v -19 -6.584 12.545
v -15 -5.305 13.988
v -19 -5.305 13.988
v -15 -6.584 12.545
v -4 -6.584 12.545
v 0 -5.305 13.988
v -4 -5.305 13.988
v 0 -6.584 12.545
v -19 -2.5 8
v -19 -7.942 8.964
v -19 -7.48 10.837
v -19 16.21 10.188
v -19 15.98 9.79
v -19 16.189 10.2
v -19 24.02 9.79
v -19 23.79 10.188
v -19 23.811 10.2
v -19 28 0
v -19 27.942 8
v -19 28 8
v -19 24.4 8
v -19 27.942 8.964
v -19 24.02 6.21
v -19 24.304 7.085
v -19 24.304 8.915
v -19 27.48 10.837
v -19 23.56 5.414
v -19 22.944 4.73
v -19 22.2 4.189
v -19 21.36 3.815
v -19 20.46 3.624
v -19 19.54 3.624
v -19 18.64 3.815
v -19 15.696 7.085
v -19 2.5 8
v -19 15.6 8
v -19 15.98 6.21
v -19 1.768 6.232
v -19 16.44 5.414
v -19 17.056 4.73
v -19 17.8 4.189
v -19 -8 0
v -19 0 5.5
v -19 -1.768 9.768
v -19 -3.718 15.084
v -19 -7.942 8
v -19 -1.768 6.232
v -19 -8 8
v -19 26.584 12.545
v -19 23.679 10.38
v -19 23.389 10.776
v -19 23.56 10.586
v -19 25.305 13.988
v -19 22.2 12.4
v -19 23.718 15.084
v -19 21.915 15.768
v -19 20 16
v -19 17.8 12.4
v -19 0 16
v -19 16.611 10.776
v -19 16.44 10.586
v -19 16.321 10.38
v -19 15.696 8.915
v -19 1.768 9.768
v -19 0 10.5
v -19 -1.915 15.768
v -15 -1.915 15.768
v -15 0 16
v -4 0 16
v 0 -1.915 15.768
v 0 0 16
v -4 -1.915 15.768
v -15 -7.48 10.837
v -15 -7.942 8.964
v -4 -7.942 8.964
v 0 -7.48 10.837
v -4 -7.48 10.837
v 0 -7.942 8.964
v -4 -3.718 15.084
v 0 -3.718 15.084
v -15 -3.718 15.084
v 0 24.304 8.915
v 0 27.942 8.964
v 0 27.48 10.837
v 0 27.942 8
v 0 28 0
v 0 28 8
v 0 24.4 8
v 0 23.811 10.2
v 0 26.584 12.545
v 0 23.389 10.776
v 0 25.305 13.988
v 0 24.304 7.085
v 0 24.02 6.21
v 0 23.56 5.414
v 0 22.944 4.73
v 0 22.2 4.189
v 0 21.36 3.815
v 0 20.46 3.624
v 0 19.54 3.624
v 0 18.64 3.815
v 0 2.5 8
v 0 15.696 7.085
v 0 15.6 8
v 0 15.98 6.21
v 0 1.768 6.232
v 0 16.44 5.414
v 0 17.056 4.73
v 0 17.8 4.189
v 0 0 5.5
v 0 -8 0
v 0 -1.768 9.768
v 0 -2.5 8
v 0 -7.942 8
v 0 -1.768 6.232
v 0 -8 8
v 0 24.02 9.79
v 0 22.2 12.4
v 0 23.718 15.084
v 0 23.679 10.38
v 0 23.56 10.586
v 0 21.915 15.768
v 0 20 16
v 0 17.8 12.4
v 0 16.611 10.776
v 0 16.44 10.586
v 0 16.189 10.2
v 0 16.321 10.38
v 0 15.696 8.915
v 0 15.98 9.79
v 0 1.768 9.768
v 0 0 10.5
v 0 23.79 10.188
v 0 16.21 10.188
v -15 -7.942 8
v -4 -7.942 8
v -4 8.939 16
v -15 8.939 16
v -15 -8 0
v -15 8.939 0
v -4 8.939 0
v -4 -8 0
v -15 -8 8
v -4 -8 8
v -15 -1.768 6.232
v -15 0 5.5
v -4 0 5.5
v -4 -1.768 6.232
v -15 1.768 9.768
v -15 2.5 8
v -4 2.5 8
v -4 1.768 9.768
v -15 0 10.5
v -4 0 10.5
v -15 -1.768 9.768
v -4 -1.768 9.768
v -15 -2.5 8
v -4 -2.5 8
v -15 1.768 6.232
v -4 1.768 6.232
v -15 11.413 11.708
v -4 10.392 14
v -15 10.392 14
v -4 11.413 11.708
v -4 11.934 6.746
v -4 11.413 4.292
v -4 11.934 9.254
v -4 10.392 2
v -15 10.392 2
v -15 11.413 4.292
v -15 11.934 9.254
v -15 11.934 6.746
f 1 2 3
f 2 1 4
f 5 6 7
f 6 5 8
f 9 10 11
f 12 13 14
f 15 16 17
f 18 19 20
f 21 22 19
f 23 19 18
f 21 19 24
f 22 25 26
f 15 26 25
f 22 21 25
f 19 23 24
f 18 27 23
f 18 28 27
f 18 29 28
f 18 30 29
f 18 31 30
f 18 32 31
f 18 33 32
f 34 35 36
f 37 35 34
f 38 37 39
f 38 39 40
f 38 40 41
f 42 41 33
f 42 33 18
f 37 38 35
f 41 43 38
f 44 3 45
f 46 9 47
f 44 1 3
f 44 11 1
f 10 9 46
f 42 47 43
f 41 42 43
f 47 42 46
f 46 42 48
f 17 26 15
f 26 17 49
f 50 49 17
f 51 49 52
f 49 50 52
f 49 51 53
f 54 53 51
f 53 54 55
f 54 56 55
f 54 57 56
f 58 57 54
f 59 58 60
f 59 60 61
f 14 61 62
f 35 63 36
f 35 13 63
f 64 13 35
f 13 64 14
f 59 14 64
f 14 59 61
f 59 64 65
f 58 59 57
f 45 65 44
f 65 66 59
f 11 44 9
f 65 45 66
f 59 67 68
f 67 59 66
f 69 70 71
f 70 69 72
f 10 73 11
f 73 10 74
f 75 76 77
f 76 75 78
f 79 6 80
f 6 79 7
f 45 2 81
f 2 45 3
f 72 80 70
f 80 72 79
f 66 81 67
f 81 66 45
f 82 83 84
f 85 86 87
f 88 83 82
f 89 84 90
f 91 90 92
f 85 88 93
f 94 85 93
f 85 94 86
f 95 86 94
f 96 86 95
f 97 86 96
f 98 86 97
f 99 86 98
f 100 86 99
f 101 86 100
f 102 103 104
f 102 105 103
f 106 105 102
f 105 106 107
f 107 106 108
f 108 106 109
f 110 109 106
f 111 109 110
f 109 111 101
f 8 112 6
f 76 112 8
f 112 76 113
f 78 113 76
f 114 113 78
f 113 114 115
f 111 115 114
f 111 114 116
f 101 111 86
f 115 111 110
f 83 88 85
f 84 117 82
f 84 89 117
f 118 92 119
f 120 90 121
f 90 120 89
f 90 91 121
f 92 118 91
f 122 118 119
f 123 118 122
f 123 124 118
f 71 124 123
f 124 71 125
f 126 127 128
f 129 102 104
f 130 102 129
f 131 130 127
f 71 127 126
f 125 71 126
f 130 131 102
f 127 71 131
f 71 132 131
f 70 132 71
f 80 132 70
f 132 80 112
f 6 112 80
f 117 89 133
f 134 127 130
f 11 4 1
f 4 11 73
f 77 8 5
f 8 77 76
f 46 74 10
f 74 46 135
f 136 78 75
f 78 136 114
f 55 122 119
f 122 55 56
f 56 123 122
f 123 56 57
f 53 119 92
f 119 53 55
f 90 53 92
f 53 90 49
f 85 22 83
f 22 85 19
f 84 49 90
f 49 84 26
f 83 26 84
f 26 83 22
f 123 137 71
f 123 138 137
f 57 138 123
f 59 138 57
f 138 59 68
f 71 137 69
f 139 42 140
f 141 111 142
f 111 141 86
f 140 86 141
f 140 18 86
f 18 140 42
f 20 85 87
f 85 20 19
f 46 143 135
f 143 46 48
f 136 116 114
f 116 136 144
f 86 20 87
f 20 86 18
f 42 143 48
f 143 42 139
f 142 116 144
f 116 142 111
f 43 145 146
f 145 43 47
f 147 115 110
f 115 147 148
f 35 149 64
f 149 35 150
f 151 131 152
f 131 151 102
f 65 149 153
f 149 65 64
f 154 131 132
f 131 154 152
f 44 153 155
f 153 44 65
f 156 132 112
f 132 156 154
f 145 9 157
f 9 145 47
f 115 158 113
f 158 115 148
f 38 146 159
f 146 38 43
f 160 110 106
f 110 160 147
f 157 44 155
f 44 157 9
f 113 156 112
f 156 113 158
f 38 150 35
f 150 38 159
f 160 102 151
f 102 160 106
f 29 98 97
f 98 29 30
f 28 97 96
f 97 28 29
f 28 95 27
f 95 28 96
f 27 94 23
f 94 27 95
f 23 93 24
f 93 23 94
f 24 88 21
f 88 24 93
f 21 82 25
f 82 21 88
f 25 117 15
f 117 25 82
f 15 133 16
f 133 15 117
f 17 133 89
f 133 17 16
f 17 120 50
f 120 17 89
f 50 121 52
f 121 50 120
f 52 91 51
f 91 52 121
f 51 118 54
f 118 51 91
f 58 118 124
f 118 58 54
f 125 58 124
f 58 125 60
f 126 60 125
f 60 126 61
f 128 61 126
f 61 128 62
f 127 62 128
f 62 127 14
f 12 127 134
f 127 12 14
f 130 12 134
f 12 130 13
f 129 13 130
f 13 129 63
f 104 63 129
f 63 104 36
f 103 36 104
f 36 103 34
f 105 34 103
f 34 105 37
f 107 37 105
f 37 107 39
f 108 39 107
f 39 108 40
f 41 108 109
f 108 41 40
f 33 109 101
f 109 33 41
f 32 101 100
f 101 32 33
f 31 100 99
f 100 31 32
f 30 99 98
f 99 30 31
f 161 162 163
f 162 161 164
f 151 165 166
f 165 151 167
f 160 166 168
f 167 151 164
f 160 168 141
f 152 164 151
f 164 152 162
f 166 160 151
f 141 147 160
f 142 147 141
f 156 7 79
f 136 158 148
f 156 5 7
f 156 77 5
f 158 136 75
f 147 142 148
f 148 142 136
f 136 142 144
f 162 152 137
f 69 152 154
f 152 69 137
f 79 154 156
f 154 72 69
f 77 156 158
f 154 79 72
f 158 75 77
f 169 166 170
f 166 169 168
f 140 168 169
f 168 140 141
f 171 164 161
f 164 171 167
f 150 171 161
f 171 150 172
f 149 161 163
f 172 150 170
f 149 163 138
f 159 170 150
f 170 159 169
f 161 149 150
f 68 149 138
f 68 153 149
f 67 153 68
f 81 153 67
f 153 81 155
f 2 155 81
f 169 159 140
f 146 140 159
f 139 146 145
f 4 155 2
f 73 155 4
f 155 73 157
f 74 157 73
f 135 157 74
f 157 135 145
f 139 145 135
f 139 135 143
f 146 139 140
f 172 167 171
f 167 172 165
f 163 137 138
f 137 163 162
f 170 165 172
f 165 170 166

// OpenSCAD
// PRUSA iteration3
// Y idler
// GNU GPL v3
// Josef Průša <iam@josefprusa.cz> and contributors
// http://www.reprap.org/wiki/Prusa_Mendel
// http://prusamendel.org


module y_idler_base(){
 translate(v = [0,0,0]) cylinder(h = 19, r=8);	
 translate(v = [0,20,0]) cylinder(h = 19, r=8);
 translate(v = [0,10,9.5]) cube(size = [16,20,19], center=true);
 translate(v = [-4,10,9.5]) cube(size = [8,16+20,19], center=true);
}

module y_idler_holes(){
 translate(v = [0,0,-1]) cylinder(h = 120, r=2.5);	
translate([0,20,20]) rotate([0,90,0]) teardrop(r=4.4,h=21,$fn=30);
 translate(v = [0,0,4]) cylinder(h = 11, r=12);
}

module teardrop (r=8,h=20)
{
rotate([-270,0,90])
linear_extrude(height=h)
{
circle(r=r);
polygon(points=[[0,0],[r*cos(30),r*sin(30)],[0.5*r,r],[-0.5*r,r],[-r*cos(30),r*sin(30)]],
paths=[[0,1,2,3,4]]);
}
}


// Final part
module y_idler(){
 translate(v = [0,0,8])rotate([0,-90,0]) difference(){
  y_idler_base();
  y_idler_holes();
 }
}

y_idler();
